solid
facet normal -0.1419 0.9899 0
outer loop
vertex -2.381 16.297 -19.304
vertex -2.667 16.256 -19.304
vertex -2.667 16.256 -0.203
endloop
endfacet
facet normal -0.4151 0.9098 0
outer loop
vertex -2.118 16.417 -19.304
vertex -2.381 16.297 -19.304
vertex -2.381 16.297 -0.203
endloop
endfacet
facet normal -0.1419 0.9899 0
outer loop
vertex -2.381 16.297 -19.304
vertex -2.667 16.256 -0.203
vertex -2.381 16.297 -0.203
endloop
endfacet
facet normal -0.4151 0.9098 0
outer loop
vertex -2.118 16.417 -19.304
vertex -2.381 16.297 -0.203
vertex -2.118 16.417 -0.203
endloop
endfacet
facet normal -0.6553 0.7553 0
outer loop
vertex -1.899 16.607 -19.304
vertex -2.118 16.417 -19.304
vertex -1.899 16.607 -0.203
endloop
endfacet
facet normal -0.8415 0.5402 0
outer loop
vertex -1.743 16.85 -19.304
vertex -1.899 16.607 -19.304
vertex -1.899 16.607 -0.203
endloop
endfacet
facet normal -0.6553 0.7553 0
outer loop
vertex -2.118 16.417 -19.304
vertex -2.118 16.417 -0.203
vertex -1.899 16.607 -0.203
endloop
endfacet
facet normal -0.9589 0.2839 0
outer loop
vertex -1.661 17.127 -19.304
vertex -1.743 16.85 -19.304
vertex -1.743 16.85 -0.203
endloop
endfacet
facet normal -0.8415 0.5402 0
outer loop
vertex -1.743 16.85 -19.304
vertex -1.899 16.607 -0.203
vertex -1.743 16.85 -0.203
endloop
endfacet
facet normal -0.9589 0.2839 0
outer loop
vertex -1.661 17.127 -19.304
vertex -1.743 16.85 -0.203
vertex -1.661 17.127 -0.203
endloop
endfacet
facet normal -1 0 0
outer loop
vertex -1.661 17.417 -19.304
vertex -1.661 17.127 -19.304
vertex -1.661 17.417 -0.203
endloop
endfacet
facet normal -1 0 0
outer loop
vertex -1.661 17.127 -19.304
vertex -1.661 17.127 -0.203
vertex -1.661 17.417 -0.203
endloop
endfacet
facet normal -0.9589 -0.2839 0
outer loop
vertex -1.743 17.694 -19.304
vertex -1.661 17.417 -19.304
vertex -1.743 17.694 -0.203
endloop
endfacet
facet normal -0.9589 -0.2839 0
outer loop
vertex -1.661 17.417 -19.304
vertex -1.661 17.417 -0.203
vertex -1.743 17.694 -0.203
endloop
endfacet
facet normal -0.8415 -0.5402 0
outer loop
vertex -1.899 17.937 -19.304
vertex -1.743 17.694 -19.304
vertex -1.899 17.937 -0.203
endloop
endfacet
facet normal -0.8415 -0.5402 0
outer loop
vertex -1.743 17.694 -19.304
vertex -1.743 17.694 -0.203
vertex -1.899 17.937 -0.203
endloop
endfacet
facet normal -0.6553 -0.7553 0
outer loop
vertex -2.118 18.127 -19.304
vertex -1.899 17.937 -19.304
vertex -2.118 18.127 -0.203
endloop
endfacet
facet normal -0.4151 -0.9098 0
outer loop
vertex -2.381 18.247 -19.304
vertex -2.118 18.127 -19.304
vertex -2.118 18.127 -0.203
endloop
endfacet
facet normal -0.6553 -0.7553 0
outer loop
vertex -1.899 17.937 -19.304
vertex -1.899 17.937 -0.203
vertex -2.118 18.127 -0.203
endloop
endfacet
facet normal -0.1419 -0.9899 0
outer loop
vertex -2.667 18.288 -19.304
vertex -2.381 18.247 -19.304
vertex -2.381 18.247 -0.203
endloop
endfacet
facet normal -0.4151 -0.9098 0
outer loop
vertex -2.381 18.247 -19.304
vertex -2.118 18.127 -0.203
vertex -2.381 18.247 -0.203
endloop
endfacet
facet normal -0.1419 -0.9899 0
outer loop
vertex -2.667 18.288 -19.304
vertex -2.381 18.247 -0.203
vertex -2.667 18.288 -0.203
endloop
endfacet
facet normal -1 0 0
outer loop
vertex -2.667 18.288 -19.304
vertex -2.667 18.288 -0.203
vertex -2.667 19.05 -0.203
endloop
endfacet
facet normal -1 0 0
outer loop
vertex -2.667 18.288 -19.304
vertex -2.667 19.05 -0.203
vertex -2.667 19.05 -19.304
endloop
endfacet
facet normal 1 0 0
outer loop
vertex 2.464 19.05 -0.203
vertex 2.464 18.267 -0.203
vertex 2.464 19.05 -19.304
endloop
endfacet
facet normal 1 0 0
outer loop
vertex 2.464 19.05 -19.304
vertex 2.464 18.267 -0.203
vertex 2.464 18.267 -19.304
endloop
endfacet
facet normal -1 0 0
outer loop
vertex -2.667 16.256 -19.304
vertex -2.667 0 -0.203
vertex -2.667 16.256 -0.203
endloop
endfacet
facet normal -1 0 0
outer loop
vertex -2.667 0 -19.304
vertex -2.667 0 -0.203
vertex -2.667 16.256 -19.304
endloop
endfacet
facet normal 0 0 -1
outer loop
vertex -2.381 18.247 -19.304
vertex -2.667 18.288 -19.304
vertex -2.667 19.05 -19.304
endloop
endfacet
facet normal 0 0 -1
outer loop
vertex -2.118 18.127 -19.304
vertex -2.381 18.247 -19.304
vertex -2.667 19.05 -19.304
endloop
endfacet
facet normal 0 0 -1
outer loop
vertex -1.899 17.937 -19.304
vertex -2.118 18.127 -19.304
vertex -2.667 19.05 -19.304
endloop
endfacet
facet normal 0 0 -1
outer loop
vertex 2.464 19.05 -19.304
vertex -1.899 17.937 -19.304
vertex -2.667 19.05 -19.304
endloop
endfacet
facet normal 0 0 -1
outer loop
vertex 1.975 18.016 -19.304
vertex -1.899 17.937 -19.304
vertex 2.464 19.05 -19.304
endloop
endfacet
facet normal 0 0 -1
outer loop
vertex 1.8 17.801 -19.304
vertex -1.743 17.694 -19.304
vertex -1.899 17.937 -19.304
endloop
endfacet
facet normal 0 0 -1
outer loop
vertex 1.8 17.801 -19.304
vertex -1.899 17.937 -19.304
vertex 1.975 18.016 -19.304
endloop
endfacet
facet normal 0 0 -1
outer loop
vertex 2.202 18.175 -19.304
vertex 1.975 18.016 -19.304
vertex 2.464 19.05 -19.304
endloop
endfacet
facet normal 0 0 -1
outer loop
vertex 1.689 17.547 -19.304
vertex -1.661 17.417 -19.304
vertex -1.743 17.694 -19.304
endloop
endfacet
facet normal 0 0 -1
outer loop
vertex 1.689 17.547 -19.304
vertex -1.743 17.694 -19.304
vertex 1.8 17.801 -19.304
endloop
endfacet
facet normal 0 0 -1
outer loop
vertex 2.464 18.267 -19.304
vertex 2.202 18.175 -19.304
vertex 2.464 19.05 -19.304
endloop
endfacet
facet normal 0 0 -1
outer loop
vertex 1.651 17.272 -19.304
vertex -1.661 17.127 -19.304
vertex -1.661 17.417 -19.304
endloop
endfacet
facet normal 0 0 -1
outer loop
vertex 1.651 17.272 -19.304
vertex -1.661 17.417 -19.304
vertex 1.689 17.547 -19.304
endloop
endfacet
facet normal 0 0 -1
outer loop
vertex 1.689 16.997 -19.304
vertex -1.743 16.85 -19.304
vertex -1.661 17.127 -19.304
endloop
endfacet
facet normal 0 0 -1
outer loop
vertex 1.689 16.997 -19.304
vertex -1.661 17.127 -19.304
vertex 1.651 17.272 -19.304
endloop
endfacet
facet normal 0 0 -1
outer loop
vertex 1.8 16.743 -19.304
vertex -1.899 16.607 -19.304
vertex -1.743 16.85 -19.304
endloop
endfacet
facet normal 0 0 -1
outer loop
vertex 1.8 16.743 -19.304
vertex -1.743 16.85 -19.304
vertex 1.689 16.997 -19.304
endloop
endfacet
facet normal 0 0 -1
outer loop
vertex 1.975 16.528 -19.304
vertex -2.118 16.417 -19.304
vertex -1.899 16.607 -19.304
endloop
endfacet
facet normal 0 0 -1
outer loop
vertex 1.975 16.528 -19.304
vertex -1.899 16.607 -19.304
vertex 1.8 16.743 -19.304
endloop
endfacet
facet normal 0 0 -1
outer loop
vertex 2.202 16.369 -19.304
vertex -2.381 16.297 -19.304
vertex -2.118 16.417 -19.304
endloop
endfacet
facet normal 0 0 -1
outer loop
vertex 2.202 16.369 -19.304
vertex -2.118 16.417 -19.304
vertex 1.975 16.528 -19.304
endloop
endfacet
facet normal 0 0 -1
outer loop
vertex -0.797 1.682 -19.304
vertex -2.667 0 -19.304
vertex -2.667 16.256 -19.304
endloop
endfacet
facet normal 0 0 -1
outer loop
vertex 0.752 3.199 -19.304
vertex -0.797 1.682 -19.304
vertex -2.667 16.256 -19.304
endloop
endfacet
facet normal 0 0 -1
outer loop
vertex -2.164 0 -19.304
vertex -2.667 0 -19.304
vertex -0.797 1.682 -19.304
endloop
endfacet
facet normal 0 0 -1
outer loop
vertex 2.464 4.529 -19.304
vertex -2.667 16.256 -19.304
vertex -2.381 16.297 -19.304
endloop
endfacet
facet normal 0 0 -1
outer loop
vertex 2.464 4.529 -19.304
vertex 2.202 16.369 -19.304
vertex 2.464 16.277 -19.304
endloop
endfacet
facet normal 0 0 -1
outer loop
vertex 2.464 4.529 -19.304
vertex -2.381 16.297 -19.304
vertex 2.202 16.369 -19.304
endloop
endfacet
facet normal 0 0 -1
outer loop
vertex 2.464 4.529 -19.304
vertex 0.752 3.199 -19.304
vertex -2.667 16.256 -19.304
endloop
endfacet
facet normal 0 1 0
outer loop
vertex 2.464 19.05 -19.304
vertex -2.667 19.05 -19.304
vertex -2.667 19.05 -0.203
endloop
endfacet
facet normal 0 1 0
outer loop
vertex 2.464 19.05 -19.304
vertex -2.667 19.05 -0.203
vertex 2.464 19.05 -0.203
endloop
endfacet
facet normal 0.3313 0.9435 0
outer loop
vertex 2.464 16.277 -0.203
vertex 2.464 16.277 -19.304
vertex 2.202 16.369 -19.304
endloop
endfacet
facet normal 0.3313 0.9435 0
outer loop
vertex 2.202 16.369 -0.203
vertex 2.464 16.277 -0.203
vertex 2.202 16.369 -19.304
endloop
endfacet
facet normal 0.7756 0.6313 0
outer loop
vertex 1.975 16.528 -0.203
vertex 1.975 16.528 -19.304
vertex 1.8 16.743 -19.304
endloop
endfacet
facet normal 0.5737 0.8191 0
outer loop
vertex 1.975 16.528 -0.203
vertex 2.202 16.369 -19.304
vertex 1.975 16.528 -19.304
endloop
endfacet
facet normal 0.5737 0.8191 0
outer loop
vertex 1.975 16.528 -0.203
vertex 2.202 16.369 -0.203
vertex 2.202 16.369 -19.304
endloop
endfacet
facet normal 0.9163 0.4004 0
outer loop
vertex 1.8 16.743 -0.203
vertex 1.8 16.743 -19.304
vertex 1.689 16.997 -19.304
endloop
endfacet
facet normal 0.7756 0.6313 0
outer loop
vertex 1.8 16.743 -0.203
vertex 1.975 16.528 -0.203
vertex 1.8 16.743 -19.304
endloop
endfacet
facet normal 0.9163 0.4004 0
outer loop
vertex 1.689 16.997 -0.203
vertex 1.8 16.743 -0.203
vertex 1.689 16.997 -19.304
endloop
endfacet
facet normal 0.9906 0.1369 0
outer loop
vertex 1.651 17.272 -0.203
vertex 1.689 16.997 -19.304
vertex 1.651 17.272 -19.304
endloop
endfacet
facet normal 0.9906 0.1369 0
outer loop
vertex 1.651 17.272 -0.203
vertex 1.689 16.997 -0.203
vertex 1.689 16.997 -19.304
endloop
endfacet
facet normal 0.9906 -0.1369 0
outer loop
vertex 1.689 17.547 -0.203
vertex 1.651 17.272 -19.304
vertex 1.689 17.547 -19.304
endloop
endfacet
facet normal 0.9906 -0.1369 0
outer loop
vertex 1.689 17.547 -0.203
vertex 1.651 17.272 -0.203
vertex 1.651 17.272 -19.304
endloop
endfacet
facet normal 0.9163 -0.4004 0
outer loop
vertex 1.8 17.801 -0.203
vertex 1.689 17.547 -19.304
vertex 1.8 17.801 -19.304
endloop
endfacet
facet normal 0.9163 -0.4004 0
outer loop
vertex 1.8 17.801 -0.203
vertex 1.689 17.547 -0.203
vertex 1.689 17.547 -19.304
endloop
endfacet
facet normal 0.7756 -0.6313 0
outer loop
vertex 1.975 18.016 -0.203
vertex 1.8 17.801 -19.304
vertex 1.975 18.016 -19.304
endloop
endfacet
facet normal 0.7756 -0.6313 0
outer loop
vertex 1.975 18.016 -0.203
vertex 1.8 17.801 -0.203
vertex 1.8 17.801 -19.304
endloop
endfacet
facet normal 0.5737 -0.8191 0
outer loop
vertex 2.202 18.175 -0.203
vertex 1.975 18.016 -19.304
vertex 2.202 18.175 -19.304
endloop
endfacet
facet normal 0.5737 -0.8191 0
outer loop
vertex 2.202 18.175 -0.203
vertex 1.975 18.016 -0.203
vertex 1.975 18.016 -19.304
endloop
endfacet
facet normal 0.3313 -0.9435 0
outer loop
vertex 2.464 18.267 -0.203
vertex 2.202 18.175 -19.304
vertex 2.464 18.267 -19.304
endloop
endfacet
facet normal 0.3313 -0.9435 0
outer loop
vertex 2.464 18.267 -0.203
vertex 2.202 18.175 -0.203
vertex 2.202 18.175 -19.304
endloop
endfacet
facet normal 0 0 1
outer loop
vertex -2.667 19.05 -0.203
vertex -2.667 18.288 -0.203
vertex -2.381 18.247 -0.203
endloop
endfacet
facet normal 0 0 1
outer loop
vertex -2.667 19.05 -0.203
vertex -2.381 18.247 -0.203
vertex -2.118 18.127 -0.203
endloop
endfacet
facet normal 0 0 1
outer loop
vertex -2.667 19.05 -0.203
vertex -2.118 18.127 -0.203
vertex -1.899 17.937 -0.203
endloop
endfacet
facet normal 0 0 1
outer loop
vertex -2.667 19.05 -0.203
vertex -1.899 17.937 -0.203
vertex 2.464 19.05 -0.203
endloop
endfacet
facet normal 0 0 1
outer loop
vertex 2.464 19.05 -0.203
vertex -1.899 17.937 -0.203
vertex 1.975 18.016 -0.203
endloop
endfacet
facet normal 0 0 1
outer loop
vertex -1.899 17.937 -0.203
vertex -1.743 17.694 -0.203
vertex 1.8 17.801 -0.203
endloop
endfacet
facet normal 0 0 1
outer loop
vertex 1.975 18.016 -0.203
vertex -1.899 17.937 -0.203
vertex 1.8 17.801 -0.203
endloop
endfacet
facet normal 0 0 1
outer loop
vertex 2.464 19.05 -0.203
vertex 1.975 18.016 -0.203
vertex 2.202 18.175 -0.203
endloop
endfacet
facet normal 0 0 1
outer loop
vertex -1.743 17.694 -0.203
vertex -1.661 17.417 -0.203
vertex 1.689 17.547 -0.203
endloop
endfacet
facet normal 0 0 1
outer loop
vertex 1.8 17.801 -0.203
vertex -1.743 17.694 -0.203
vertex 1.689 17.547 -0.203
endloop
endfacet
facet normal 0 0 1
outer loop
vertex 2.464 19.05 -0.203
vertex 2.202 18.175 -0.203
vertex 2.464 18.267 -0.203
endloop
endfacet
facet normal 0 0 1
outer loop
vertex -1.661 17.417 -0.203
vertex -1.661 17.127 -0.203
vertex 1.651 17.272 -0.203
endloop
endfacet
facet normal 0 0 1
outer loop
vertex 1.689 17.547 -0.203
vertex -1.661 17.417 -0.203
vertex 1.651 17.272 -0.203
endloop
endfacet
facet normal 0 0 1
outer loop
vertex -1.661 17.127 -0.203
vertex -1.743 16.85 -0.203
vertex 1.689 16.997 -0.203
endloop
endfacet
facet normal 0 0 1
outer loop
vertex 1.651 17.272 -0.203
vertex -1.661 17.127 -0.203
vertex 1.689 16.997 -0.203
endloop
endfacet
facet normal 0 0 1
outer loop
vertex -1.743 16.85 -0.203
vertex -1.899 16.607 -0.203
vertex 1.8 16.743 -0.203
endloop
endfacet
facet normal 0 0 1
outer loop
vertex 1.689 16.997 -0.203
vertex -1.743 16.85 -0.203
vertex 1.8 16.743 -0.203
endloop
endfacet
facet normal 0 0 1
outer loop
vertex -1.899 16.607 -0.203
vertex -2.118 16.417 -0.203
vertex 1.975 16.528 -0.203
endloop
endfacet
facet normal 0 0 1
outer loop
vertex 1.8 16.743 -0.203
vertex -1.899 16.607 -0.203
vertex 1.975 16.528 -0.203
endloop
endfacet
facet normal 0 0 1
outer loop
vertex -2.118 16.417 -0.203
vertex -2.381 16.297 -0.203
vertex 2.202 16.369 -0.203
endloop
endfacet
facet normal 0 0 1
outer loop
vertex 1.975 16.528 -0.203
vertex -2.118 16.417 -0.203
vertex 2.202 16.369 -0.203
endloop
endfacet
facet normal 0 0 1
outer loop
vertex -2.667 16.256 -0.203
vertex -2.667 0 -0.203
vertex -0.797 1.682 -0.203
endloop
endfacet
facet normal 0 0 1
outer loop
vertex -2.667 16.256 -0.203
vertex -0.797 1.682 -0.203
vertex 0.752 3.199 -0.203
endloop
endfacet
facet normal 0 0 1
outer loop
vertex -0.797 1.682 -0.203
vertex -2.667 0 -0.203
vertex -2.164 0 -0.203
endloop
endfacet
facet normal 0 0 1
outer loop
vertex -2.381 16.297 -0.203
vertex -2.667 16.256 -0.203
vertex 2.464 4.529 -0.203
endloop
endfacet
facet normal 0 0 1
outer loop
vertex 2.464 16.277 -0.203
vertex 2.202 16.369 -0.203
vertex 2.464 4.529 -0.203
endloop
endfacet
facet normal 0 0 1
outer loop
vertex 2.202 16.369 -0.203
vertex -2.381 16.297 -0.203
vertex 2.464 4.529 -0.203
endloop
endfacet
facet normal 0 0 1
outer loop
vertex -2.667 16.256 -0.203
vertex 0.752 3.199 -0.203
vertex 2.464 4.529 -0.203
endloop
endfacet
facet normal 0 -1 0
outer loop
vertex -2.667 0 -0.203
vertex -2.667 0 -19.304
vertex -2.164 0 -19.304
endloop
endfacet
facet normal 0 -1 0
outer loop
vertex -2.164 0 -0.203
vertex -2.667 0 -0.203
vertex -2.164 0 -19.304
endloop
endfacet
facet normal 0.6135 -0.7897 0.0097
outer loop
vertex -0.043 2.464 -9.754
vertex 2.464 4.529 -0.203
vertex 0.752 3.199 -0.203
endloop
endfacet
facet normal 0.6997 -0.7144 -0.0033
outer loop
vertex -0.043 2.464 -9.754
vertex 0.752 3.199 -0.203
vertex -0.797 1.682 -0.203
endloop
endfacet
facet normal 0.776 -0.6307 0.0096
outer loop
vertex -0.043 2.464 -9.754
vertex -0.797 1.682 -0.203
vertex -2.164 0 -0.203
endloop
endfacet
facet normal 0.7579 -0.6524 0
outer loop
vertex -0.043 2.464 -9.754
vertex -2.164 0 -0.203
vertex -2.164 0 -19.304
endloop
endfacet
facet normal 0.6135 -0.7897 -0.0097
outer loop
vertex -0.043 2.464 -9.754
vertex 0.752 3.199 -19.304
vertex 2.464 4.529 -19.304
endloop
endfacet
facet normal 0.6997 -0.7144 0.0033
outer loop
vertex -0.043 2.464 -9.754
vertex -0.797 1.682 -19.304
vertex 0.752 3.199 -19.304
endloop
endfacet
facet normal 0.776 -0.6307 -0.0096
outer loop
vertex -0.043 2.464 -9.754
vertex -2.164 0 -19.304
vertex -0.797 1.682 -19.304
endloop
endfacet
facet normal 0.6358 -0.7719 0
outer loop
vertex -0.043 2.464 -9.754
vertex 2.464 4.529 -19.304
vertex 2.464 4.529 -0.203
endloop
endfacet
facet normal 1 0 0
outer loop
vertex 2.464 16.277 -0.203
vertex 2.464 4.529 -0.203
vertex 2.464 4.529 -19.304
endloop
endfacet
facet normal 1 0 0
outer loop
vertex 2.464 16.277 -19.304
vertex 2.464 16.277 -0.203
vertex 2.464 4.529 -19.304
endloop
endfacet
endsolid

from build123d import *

# Parameters (mm, degrees)
ESQUISSE1_W             = 5.1308
ESQUISSE1_H             = 19.1008
BOSS_EXTRU_1_DEPTH      = 19.05
ENL_V_MAT_EXTRU_1_DEPTH = 20.304
ENL_V_MAT_EXTRU_2_DEPTH = 20.3040001


with BuildPart() as part:
    # Esquisse1 → Boss.-Extru.1 (new body)
    with BuildSketch(Plane(origin=(0, 0, 0), x_dir=(1, 0, 0), z_dir=(0, 1, 0))):
        with Locations((-0.1016, 9.7536)):
            Rectangle(ESQUISSE1_W, ESQUISSE1_H)
    extrude(amount=BOSS_EXTRU_1_DEPTH)

    # Esquisse2 → Enlèv. mat.-Extru.1 (cut, through all)
    with BuildSketch(Plane.XY):
        with BuildLine():
            Line((2.4638, 4.529252061), (2.4638, 0))
            Line((2.4638, 0), (-2.164205313, 0))
            add(Edge.make_bspline(
                [(-2.164205313, 0), (-0.235595225, 2.663077002), (2.4638, 4.529252061)],
                knots=[0, 0, 0, 1, 1, 1], degree=2))
        make_face()
    extrude(amount=-ENL_V_MAT_EXTRU_1_DEPTH, mode=Mode.SUBTRACT)

    # Esquisse3 → Enlèv. mat.-Extru.2 (cut, through all)
    with BuildSketch(Plane.XY):
        with BuildLine():
            Line((-2.667, 18.288), (-2.667, 16.256))
            ThreePointArc((-2.667, 16.256), (-1.651, 17.272), (-2.667, 18.288))
        make_face()
    enl_v_mat_extru_2 = extrude(amount=-ENL_V_MAT_EXTRU_2_DEPTH, mode=Mode.SUBTRACT)

    # Symétrie1: Enlèv. mat.-Extru.2 across plane
    add(enl_v_mat_extru_2.mirror(Plane(origin=(0, 0, 0), x_dir=(0, 0, 1), z_dir=(1, 0, 0))), mode=Mode.SUBTRACT)


solid = part.part
